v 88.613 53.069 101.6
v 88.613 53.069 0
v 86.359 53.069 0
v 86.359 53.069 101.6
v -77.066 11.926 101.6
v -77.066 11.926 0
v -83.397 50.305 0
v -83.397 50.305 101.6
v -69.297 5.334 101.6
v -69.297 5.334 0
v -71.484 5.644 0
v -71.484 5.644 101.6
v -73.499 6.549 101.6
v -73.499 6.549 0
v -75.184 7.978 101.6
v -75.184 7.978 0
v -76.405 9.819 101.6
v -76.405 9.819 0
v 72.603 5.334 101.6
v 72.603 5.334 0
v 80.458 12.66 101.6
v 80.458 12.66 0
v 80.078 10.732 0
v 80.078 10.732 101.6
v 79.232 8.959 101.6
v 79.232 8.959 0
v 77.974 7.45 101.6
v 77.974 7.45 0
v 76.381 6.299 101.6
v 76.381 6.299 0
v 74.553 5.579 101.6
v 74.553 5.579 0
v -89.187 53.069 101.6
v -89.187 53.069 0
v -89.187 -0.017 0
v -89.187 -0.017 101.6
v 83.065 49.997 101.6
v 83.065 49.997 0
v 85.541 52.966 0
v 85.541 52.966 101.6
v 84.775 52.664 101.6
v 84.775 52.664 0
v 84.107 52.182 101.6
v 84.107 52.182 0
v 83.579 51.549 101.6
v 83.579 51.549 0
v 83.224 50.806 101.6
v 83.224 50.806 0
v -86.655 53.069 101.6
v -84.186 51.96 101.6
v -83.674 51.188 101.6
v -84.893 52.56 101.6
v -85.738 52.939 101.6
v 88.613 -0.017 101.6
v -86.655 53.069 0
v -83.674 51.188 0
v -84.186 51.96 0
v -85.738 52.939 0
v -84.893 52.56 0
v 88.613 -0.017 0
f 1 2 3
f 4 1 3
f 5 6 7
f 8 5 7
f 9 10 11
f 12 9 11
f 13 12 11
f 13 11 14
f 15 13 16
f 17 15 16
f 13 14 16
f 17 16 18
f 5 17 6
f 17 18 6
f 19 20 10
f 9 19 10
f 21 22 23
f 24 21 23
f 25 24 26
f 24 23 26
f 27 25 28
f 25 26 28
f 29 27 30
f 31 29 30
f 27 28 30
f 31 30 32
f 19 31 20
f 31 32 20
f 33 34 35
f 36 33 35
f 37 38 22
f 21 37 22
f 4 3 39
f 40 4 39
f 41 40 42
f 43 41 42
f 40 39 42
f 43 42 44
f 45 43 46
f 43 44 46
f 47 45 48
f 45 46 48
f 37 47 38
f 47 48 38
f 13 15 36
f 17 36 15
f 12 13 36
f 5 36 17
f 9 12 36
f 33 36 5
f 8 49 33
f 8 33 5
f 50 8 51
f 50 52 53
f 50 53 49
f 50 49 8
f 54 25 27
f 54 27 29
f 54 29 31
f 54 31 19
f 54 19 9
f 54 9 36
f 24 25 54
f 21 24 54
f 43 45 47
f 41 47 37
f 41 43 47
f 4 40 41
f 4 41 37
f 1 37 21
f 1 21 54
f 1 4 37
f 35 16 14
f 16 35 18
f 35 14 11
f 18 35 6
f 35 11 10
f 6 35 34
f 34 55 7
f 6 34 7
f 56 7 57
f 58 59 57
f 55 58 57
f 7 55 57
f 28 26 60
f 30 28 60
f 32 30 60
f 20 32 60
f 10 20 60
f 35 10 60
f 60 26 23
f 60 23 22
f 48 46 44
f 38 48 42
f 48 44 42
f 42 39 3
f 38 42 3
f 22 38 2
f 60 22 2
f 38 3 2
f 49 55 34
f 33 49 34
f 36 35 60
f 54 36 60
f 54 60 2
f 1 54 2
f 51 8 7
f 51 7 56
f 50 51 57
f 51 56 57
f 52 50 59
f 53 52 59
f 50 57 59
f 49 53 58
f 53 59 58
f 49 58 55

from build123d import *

# Parameters (mm, degrees)
F1_DEPTH = 101.6


with BuildPart() as f1:
    # F0 (on Top) → F1 (new body)
    with BuildSketch(Plane.XY):
        with BuildLine():
            Line((-89.186773, -0.016751), (88.613227, -0.016751))
            Line((88.613227, -0.016751), (88.613227, 53.069249))
            Line((88.613227, 53.069249), (86.358745, 53.069249))
            ThreePointArc((86.358745, 53.069249), (84.106649, 52.18205), (83.064762, 49.997207))
            Line((83.064762, 49.997207), (80.458159, 12.659636))
            ThreePointArc((80.458159, 12.659636), (77.973661, 7.449628), (72.603276, 5.334))
            Line((72.603276, 5.334), (-69.297198, 5.334))
            ThreePointArc((-69.297198, 5.334), (-74.391767, 7.204231), (-77.066214, 11.926489))
            Line((-77.066214, 11.926489), (-83.396749, 50.304656))
            ThreePointArc((-83.396749, 50.304656), (-84.518291, 52.284958), (-86.654724, 53.069249))
            Line((-86.654724, 53.069249), (-89.186773, 53.069249))
            Line((-89.186773, 53.069249), (-89.186773, -0.016751))
        make_face()
    extrude(amount=F1_DEPTH)


solid = f1.part
